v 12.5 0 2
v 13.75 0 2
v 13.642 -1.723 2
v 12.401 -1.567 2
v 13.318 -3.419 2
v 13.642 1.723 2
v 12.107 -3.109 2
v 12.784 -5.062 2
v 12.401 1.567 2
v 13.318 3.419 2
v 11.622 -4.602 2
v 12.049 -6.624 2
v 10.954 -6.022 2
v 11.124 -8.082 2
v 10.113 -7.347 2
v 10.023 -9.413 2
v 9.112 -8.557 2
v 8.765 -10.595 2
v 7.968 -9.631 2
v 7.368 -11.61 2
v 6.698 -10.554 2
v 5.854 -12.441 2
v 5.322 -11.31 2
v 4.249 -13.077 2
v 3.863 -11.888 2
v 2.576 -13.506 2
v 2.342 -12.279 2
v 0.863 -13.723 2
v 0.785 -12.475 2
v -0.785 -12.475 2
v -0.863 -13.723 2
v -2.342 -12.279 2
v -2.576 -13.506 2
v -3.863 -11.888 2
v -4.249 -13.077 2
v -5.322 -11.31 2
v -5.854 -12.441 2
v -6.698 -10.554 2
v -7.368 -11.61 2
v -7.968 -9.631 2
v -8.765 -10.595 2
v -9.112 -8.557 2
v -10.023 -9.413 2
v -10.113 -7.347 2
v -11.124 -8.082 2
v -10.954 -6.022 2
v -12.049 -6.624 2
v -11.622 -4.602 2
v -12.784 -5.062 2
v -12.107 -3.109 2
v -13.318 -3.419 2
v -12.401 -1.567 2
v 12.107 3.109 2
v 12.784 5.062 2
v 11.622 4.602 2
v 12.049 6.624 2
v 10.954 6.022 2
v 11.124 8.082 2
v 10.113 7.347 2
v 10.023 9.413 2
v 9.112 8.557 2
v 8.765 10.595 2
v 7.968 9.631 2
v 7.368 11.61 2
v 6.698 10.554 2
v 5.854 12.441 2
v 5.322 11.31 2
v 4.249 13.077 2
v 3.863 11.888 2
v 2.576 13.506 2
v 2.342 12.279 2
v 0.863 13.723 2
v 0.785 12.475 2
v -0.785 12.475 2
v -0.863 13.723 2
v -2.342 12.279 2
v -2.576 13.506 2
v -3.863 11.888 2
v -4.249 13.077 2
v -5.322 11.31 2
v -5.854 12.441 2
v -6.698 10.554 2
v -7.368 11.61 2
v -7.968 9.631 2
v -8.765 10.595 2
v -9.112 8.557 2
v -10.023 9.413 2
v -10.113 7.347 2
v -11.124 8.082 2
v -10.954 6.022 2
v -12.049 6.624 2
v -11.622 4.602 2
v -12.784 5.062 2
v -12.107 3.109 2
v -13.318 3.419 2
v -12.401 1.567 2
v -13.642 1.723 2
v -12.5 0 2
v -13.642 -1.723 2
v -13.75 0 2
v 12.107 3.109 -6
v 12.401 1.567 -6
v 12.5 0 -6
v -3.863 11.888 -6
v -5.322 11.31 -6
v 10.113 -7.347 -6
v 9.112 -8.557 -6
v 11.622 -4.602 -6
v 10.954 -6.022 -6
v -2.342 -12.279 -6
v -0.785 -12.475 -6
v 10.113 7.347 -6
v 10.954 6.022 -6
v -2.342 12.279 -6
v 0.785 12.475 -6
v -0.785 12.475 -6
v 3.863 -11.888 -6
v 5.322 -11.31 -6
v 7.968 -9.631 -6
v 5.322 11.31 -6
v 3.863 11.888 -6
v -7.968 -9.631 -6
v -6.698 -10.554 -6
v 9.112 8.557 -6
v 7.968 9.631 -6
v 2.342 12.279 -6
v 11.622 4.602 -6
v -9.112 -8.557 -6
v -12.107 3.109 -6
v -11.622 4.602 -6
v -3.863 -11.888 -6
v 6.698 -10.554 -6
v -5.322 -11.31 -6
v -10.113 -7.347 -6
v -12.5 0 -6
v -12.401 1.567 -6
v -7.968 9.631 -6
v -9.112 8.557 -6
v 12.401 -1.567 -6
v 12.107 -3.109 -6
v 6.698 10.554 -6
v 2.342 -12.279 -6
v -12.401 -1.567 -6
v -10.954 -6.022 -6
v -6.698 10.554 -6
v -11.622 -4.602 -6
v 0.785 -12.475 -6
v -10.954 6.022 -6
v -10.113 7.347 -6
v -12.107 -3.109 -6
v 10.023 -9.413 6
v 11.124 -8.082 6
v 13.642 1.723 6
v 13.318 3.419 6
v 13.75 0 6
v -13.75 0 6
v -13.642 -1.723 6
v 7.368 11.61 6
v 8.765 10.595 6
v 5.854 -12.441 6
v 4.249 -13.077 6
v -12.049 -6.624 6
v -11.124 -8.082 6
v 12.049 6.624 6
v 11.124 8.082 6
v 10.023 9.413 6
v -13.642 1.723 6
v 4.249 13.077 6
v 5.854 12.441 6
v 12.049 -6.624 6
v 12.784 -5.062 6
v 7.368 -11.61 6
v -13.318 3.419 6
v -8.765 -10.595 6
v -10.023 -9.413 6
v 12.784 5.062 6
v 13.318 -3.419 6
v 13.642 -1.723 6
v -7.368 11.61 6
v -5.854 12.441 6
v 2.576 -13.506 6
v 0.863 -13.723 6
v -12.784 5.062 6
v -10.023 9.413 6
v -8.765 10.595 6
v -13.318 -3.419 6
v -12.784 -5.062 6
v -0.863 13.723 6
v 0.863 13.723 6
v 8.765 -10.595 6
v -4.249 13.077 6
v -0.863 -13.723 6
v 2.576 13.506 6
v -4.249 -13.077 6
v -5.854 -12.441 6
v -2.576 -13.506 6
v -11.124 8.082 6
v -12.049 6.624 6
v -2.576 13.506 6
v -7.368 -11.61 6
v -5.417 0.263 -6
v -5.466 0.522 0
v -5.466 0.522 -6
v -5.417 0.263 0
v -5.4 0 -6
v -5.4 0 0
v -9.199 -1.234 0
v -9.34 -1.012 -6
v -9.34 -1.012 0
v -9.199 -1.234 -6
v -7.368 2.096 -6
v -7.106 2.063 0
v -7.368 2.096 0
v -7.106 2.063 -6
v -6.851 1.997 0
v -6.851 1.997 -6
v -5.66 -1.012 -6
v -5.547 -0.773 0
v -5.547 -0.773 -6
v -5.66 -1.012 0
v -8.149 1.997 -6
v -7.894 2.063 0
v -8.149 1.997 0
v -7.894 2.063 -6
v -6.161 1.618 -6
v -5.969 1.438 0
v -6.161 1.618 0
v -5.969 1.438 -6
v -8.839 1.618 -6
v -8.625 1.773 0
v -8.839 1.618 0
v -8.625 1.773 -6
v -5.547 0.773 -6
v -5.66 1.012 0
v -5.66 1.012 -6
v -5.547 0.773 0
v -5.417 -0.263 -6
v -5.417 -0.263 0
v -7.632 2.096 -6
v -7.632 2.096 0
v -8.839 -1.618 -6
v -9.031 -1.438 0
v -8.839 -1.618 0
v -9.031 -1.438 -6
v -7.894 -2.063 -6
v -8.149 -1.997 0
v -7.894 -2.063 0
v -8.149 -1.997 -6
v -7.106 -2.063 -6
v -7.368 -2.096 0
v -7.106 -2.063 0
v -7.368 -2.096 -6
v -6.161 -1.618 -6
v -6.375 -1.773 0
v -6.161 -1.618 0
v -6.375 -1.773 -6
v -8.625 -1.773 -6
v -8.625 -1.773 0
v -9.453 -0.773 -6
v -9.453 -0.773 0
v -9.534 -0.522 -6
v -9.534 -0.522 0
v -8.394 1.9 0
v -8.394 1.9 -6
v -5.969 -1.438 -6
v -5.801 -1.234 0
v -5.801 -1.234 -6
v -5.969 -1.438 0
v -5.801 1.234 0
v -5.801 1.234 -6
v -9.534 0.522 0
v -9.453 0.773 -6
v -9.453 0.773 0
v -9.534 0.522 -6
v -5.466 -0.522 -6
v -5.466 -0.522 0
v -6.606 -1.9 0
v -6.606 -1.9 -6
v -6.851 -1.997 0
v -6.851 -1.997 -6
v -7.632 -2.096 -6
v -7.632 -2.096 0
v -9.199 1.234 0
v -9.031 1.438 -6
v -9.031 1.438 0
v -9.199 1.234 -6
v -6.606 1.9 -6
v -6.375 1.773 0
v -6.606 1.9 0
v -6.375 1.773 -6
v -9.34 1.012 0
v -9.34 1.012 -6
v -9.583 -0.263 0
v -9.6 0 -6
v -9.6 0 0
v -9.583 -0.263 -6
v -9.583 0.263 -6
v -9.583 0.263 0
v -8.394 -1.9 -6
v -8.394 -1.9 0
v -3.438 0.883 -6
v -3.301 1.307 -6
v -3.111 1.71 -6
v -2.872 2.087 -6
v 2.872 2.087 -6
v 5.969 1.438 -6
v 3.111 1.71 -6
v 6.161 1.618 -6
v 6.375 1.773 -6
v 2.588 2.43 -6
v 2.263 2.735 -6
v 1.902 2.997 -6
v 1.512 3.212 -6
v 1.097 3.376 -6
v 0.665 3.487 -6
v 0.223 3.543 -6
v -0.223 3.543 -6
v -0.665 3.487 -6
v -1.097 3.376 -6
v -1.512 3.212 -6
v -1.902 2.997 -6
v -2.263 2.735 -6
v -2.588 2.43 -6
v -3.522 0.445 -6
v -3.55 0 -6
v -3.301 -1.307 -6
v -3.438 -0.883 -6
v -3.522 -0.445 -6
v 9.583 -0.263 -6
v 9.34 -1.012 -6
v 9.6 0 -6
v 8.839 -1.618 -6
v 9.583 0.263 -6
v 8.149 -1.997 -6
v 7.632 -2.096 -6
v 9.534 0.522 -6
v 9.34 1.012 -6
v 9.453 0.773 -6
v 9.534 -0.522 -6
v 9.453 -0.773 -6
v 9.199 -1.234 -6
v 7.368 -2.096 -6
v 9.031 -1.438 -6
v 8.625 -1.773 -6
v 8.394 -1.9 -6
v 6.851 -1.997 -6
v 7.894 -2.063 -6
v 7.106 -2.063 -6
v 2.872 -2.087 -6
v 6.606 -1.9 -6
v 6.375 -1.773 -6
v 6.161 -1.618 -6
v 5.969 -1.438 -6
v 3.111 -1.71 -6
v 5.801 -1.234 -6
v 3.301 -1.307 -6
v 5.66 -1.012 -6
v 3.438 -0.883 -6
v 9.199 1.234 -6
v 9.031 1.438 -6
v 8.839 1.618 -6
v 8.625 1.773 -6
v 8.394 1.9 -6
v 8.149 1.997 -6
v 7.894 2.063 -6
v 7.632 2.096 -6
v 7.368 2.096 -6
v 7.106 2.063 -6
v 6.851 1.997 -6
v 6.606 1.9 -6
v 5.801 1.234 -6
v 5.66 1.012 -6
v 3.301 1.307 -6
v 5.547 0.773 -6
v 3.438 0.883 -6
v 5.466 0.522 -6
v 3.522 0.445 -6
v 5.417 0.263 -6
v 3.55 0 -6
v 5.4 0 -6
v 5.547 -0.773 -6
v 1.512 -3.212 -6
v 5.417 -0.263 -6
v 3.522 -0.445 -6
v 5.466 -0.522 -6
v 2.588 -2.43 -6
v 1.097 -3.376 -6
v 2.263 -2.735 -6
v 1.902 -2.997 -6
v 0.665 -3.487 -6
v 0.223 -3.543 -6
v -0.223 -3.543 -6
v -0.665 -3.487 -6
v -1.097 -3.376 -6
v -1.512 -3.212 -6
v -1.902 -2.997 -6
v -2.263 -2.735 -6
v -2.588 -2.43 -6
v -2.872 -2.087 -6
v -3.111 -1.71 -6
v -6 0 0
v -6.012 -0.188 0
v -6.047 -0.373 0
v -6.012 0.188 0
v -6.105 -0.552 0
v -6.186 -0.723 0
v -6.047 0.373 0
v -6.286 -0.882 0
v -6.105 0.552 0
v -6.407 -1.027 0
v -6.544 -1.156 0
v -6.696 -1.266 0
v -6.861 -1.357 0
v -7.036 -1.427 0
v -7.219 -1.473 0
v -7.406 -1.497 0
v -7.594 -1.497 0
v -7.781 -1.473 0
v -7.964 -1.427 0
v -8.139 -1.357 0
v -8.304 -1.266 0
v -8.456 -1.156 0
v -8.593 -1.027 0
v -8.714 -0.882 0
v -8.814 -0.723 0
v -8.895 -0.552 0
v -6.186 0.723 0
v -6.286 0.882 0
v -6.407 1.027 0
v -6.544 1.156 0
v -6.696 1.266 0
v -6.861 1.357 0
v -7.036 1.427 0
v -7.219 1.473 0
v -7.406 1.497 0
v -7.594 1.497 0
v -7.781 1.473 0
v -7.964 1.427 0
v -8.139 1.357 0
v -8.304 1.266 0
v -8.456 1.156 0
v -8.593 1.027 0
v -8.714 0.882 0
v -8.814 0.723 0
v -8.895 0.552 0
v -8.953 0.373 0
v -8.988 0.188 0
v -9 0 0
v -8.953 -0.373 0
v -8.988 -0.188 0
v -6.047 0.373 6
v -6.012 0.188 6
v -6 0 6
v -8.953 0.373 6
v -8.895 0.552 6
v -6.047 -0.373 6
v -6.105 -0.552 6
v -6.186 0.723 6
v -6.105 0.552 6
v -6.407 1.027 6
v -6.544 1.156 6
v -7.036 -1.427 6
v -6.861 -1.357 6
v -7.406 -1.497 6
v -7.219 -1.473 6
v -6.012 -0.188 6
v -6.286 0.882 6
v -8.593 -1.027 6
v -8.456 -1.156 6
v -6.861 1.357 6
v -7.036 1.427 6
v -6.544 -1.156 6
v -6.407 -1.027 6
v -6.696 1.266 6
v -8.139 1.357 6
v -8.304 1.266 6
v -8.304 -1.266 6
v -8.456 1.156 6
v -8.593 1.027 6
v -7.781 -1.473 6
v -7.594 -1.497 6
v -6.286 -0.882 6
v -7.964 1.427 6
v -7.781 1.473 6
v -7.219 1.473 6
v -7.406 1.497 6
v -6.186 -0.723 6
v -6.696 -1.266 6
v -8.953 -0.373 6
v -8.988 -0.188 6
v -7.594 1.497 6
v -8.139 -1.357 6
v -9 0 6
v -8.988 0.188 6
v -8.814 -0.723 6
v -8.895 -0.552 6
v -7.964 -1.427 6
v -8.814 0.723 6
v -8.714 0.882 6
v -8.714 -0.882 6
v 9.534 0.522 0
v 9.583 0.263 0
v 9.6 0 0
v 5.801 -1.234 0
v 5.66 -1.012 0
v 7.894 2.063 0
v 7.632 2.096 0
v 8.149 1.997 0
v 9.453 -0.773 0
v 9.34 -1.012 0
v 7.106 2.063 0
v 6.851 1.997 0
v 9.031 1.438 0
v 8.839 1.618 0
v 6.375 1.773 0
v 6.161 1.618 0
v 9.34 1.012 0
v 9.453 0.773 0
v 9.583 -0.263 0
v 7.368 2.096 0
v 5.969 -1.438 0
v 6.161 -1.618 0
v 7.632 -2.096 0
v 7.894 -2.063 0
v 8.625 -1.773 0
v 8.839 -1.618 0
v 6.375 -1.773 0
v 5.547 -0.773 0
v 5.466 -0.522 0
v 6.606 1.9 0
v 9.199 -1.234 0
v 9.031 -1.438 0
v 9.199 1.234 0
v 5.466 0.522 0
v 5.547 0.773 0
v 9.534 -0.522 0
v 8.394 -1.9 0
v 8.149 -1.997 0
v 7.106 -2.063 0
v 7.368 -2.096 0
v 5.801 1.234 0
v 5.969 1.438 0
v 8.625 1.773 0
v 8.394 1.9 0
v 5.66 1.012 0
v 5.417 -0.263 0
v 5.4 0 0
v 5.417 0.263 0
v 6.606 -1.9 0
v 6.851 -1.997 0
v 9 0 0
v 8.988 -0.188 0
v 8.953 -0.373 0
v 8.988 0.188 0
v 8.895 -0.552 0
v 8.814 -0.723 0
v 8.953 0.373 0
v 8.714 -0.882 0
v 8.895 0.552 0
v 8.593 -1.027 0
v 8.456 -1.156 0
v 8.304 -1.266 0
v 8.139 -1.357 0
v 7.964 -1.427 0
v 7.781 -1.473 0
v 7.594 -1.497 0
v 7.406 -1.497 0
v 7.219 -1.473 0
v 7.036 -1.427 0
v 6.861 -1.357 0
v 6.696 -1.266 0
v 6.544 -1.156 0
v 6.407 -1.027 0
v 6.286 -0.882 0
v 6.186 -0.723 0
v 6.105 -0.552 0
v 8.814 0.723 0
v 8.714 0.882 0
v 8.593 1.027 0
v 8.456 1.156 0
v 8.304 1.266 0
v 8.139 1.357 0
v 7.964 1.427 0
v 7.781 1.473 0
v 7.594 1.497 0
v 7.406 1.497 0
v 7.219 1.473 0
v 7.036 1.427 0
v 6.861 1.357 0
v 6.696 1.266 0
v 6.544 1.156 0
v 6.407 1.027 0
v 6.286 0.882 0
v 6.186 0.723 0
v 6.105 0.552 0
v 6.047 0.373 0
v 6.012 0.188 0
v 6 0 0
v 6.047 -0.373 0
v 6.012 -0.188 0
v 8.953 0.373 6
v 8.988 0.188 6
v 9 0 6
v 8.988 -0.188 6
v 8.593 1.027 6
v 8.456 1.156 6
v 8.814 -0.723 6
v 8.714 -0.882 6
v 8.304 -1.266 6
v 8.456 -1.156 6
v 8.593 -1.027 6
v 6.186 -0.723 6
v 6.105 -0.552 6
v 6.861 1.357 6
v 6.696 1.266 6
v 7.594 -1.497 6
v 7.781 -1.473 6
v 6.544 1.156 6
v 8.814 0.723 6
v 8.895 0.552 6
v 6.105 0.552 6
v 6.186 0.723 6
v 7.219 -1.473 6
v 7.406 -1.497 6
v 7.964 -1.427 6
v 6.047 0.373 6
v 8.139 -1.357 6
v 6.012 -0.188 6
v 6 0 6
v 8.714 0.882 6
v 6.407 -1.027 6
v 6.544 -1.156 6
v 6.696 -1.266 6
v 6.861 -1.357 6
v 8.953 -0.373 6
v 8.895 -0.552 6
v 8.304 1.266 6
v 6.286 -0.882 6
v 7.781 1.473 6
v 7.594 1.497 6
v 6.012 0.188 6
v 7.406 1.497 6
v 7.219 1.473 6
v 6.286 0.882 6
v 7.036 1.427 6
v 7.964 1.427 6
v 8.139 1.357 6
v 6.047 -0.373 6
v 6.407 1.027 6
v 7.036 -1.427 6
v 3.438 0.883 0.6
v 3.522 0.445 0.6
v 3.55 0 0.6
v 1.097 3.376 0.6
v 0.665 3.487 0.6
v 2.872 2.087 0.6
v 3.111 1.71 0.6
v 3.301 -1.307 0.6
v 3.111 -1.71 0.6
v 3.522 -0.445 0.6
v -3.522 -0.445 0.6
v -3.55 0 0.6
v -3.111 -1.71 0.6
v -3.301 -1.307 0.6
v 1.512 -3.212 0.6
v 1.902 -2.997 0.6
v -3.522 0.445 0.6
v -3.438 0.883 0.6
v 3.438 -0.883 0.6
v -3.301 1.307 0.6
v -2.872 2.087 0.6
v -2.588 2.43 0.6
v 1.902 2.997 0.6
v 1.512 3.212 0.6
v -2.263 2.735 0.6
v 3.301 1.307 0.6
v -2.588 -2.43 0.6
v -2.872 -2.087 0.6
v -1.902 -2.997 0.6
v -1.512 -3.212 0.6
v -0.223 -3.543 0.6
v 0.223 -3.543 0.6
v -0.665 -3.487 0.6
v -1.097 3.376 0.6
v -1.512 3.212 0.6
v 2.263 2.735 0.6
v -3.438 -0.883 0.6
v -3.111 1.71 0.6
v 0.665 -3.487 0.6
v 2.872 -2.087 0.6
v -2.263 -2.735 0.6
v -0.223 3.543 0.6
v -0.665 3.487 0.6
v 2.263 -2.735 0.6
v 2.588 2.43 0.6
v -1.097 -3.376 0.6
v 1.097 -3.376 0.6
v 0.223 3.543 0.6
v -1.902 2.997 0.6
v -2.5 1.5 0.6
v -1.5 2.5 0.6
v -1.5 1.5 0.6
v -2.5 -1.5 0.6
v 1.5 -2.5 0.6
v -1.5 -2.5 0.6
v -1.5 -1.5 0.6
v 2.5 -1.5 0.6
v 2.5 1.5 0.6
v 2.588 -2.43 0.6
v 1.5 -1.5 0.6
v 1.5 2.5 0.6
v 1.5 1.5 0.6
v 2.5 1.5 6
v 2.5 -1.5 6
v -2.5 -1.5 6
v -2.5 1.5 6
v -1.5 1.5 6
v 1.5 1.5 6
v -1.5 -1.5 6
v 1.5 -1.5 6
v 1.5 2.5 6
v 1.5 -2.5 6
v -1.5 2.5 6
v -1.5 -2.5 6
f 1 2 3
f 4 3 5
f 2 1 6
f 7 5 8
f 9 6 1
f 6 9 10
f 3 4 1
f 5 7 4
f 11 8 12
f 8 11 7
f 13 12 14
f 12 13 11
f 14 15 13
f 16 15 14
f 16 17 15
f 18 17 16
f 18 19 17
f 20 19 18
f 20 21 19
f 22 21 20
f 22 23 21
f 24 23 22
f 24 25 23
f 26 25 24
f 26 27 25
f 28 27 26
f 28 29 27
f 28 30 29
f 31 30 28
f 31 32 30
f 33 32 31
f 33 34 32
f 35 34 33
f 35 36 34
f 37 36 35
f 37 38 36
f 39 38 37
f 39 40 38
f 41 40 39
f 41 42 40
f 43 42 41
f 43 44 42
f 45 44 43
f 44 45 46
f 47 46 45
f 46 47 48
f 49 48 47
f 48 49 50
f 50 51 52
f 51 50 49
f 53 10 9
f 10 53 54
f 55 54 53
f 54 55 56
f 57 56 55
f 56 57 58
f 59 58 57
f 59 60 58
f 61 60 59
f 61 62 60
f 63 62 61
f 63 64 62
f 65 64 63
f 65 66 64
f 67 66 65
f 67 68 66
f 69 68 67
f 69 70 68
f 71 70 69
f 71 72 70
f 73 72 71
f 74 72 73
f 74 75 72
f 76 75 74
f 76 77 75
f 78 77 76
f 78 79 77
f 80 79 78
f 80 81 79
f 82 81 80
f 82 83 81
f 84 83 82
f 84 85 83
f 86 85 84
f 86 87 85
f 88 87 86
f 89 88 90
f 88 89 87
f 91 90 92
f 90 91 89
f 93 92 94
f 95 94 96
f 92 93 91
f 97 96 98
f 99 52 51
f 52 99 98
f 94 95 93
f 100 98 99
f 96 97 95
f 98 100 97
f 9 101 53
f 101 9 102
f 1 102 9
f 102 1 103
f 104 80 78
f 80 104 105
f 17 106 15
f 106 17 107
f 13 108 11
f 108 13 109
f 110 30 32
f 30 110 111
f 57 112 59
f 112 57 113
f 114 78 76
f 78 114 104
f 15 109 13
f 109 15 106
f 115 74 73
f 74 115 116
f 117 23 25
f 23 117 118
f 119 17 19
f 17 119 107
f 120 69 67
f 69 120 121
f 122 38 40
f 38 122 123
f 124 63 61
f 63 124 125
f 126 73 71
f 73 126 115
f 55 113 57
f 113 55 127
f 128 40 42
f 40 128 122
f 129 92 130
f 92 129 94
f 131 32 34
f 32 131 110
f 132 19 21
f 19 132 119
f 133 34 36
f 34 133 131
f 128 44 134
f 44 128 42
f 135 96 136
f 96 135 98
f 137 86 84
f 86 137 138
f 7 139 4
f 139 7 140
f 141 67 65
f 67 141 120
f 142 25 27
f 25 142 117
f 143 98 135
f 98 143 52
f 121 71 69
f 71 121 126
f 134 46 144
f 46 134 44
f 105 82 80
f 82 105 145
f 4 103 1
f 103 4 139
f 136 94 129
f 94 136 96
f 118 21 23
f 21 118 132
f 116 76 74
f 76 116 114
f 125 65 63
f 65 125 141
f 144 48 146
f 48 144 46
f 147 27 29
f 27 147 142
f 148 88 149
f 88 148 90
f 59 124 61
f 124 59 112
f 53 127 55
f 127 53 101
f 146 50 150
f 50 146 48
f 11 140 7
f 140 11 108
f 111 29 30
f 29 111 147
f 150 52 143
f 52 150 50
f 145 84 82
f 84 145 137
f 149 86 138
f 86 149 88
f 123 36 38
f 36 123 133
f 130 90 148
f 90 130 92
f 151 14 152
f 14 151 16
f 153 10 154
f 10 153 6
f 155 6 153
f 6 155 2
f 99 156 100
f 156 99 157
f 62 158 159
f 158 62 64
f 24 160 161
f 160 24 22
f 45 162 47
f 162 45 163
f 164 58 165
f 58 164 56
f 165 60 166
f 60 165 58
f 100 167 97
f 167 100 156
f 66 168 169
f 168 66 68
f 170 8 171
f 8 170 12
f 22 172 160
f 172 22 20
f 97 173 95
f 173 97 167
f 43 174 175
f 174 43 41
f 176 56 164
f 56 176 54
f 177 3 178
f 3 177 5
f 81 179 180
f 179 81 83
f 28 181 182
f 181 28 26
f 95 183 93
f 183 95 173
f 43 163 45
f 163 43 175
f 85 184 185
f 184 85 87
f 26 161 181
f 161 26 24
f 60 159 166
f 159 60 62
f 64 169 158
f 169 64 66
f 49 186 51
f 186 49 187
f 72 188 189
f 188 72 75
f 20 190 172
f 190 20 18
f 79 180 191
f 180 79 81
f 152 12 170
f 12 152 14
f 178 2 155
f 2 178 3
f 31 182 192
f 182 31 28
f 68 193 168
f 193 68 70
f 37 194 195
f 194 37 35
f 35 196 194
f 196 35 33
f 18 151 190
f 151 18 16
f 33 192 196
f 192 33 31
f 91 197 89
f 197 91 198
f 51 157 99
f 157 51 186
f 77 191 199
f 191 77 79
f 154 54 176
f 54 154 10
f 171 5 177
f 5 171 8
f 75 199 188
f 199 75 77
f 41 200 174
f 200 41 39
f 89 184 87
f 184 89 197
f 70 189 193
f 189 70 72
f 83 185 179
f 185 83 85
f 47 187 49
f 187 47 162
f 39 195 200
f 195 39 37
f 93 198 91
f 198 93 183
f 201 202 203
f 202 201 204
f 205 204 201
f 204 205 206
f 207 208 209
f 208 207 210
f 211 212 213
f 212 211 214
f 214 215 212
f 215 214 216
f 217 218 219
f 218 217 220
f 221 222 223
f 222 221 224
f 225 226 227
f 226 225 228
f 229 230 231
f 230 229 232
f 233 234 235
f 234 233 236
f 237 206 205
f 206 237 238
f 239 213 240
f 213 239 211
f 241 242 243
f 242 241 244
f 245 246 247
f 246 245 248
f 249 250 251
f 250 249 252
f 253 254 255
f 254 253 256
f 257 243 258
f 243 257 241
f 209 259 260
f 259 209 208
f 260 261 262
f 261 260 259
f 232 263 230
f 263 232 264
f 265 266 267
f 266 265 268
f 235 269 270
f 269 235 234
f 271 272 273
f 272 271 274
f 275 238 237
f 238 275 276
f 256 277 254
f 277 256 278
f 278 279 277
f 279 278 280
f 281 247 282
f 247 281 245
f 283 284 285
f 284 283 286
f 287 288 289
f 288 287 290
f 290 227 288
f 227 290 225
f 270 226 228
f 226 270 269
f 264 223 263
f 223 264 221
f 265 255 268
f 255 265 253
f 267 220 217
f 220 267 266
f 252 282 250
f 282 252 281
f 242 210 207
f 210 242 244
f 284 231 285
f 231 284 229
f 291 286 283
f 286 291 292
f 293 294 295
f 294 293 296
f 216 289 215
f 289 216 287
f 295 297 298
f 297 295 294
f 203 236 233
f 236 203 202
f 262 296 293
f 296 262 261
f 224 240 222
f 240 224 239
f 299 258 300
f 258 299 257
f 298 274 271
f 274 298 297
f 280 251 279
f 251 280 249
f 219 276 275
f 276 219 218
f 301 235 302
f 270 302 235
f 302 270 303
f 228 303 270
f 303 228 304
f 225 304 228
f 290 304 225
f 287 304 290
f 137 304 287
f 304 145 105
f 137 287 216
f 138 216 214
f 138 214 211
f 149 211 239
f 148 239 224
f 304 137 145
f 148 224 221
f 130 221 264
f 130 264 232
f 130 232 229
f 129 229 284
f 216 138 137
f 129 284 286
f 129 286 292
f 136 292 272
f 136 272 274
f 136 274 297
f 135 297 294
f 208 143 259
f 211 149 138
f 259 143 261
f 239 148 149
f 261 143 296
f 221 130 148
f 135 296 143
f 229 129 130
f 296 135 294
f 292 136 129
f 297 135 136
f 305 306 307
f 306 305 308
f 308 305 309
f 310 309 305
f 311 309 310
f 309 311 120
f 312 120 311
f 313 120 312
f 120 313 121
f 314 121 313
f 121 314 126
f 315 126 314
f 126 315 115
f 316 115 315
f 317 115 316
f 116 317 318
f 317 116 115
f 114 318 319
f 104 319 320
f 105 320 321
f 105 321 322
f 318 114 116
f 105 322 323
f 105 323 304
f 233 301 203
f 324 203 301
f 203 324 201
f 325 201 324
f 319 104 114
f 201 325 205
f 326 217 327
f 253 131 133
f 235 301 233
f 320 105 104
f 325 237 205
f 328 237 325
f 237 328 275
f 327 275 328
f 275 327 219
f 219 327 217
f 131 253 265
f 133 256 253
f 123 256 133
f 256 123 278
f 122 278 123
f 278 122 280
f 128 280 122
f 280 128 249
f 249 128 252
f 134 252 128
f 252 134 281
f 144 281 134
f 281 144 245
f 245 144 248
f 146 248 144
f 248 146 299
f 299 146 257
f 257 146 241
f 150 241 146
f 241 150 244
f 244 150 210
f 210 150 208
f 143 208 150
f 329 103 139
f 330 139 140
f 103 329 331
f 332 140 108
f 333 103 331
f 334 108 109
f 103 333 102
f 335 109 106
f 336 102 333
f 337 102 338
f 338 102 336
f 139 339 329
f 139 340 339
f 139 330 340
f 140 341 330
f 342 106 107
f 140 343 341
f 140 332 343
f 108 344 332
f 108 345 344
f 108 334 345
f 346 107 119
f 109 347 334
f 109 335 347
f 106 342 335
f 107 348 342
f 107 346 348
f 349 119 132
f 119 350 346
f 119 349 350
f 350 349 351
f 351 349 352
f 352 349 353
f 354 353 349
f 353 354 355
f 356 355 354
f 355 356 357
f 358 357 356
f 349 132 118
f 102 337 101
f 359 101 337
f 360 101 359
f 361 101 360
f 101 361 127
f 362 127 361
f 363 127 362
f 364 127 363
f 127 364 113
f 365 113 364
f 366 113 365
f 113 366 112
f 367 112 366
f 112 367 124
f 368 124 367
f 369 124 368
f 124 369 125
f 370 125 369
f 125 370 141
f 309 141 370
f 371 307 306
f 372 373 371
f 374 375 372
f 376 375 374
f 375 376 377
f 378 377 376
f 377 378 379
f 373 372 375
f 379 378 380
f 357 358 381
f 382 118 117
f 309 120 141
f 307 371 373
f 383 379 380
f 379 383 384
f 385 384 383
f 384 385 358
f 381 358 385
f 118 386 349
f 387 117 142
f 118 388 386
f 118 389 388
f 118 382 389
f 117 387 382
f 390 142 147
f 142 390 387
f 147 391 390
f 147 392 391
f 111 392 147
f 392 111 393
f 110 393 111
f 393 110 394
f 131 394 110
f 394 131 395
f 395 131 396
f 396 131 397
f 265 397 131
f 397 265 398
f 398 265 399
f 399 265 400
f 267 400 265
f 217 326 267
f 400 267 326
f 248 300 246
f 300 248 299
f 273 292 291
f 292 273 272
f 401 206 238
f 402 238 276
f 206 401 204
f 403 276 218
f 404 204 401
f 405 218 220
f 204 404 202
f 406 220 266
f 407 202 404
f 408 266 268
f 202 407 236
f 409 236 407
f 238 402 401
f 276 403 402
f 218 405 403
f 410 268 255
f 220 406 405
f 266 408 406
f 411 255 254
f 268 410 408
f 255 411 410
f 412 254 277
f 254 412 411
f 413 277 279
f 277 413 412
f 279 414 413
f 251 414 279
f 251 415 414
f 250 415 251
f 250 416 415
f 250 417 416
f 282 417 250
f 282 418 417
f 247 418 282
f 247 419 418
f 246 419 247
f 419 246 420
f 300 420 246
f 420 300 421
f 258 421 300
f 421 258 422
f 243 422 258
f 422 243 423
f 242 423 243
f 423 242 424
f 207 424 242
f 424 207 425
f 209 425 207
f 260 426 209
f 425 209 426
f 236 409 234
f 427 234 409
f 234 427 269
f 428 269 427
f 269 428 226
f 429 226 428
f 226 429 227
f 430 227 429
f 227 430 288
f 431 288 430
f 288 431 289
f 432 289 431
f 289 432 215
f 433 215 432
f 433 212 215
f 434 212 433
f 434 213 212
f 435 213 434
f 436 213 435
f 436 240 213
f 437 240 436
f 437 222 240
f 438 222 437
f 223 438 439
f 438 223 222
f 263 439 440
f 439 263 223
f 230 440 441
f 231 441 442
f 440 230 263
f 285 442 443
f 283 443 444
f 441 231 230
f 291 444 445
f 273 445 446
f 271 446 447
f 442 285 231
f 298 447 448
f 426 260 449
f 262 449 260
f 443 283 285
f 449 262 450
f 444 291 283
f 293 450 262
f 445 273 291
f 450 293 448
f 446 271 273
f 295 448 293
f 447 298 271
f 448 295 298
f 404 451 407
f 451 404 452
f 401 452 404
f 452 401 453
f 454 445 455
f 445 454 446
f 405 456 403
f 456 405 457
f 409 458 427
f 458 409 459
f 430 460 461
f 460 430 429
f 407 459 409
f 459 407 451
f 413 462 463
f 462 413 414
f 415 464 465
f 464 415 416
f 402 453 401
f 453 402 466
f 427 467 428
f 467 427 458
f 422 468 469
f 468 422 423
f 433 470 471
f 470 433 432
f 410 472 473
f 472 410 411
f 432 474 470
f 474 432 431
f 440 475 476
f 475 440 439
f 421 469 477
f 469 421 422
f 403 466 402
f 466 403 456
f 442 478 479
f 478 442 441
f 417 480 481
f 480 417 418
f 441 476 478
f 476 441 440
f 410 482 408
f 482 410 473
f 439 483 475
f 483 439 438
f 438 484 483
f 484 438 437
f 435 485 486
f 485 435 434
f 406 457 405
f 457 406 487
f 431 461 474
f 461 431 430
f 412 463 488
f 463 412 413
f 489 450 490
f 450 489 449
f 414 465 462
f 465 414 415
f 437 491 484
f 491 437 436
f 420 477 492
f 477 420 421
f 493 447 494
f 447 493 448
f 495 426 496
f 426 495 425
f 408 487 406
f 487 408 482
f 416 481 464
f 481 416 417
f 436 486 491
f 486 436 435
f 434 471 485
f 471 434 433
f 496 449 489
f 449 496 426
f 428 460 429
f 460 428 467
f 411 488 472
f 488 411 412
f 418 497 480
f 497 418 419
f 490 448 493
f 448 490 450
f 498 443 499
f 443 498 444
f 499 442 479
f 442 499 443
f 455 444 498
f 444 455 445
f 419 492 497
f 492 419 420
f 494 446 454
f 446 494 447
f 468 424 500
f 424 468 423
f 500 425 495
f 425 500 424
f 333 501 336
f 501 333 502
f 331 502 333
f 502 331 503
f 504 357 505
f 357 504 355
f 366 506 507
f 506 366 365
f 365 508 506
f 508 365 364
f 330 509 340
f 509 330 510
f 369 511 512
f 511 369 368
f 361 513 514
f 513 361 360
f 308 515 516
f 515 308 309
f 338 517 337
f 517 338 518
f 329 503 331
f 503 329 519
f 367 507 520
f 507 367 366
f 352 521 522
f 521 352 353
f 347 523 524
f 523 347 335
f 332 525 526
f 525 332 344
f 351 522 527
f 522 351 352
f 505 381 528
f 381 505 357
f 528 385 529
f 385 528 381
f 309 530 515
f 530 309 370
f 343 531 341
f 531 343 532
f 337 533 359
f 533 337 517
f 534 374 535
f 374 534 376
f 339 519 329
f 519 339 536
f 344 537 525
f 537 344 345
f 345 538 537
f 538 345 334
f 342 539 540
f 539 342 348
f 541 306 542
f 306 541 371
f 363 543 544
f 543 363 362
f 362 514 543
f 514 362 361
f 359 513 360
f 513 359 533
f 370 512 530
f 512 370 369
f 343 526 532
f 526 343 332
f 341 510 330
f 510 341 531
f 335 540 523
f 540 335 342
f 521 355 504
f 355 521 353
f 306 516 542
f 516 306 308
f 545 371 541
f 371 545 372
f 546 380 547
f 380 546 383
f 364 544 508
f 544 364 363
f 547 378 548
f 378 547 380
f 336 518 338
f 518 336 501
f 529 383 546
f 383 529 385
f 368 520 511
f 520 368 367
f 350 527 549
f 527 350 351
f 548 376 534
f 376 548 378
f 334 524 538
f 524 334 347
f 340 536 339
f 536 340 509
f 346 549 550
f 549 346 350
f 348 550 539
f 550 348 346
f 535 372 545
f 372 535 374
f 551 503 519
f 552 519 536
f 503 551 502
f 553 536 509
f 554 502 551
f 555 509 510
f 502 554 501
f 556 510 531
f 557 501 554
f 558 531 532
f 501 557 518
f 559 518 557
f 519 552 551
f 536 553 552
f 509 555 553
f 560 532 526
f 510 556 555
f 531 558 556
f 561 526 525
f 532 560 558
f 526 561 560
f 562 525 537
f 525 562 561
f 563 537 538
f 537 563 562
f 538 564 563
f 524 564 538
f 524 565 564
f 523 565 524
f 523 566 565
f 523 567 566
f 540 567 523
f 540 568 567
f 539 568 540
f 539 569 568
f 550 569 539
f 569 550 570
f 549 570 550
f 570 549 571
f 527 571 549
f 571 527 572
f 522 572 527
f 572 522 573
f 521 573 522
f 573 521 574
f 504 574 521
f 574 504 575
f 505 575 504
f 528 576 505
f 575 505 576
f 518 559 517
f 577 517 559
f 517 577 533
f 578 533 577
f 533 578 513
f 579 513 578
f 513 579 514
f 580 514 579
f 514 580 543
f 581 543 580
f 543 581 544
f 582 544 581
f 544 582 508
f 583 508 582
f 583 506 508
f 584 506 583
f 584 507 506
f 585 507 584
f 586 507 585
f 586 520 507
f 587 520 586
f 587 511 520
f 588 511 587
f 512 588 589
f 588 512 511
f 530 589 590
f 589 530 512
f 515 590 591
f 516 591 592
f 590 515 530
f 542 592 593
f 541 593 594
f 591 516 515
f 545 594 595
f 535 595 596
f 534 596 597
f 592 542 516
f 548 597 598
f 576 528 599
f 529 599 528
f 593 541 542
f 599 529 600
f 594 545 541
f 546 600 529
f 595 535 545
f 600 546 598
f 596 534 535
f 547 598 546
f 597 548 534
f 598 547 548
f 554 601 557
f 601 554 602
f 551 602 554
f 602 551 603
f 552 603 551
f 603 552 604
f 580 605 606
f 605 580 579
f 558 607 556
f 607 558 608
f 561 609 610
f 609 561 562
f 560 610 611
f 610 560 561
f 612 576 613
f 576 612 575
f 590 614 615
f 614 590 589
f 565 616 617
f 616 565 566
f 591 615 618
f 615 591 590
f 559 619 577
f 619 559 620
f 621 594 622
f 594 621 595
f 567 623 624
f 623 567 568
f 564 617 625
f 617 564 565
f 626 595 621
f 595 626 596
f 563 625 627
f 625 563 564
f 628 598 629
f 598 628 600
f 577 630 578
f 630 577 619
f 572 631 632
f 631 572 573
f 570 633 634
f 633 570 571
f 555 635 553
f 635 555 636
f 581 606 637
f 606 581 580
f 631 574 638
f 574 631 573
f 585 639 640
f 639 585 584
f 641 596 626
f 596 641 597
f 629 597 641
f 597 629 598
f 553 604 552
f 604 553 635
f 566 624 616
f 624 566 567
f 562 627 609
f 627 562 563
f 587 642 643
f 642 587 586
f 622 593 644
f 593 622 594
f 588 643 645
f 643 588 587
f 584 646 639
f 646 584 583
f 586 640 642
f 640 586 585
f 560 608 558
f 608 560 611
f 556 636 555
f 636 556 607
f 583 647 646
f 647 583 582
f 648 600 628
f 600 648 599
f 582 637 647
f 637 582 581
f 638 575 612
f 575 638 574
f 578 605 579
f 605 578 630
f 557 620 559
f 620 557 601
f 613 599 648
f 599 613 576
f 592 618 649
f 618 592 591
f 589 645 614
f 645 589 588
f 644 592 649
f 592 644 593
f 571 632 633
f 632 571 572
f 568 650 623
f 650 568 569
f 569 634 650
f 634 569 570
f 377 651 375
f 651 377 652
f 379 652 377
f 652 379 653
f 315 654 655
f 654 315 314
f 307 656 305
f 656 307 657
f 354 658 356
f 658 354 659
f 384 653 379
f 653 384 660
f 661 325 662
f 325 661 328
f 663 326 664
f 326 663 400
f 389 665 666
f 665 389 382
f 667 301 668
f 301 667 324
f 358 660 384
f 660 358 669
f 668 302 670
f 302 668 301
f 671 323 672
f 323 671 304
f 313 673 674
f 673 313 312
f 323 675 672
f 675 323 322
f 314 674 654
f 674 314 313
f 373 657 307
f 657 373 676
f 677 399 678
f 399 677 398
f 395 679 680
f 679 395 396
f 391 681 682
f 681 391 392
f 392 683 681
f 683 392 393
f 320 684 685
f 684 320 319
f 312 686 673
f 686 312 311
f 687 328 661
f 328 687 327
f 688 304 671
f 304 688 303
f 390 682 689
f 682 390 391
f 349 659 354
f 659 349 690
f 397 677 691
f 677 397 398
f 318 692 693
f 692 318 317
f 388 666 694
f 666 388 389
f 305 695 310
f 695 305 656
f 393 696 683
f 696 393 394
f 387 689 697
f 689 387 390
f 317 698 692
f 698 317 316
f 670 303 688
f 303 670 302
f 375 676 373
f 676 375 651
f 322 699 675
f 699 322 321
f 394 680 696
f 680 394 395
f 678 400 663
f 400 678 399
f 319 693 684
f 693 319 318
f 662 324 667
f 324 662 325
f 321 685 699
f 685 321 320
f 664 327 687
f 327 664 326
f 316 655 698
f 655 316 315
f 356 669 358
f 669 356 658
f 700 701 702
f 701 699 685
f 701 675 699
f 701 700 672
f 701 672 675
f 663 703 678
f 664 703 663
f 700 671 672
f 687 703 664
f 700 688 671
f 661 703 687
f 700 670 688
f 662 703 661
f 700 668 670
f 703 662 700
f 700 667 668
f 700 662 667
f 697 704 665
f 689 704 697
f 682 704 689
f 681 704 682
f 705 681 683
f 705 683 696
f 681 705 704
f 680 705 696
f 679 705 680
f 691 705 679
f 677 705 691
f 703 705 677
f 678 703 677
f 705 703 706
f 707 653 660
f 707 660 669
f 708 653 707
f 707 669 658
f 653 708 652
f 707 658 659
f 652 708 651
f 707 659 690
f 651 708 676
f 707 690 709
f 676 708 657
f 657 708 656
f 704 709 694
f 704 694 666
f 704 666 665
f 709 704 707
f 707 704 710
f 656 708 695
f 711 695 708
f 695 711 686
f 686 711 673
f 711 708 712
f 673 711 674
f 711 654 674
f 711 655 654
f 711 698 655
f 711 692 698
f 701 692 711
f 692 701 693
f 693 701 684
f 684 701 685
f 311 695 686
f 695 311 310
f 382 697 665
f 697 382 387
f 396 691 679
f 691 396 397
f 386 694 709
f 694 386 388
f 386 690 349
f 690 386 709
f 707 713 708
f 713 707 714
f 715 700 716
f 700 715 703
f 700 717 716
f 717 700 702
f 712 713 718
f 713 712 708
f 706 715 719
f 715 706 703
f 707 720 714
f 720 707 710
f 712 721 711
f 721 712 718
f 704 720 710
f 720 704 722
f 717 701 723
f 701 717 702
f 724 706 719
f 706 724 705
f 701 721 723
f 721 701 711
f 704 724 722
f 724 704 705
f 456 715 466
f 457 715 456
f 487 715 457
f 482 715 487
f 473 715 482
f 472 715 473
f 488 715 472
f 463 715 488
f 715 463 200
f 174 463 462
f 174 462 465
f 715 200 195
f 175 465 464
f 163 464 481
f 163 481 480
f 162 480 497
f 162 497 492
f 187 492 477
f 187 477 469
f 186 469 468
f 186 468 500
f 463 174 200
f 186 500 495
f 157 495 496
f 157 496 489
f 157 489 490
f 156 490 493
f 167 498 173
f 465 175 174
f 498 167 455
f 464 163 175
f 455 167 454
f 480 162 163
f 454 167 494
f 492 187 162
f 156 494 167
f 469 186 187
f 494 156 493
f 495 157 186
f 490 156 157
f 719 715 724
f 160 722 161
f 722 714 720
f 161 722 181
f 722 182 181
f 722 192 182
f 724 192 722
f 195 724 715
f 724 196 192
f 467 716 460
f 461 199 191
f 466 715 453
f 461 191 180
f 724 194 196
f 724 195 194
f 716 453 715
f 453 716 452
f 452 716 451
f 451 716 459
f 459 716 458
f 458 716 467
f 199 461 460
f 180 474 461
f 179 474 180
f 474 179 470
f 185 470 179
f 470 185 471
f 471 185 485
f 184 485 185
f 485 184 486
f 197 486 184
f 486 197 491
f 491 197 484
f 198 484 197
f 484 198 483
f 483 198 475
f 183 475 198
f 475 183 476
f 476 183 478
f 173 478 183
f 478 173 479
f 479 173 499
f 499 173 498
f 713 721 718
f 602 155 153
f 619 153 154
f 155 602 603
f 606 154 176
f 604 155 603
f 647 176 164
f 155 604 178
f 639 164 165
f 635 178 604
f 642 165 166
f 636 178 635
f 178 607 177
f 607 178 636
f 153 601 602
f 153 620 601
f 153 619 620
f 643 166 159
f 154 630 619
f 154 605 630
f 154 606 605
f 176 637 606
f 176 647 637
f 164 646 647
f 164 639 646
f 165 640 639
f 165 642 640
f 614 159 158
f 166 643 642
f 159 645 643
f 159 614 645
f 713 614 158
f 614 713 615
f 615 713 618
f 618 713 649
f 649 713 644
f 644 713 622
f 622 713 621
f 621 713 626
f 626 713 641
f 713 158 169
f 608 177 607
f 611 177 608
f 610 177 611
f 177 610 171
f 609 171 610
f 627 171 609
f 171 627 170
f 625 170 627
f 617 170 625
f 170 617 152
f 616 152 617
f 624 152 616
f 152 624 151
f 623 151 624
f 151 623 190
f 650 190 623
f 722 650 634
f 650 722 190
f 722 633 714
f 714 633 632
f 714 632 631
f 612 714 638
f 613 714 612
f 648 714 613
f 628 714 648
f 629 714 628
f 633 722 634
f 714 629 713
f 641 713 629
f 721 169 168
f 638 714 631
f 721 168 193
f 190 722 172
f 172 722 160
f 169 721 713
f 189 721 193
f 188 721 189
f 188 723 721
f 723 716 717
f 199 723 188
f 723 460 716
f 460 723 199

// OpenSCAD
$fn = 50;

difference() {
	union() {
		translate(v = [0, 0, 0]) {
			rotate(a = [0, 0, 0]) {
				difference() {
					union() {
						translate(v = [0, 0, -6.0]) {
							cylinder(h = 12, r = 14.5);
						}
					}
					union() {
						translate(v = [0, 0, 0]) {
							rotate(a = [0, 0, 0]) {
								difference() {
									union() {
										translate(v = [0, 0, -2.0]) {
											cylinder(h = 4, r = 16.0);
										}
									}
									union() {
										translate(v = [0, 0, -2.01]) {
											cylinder(h = 4.02, r = 12.5);
										}
									}
								}
							}
						}
						translate(v = [0, 0, -3]) {
							rotate(a = [0, 0, 0]) {
								difference() {
									union() {
										translate(v = [0, 0, -2.0]) {
											cylinder(h = 4, r = 16.0);
										}
									}
									union() {
										translate(v = [0, 0, -2.01]) {
											cylinder(h = 4.02, r = 12.5);
										}
									}
								}
							}
						}
						translate(v = [0, 0, -6]) {
							rotate(a = [0, 0, 0]) {
								difference() {
									union() {
										translate(v = [0, 0, -2.0]) {
											cylinder(h = 4, r = 16.0);
										}
									}
									union() {
										translate(v = [0, 0, -2.01]) {
											cylinder(h = 4.02, r = 12.5);
										}
									}
								}
							}
						}
						translate(v = [0, 0, 0]) {
							rotate(a = [0, 0, 0]) {
								difference() {
									union() {
										translate(v = [0, 0, -21.0]) {
											cylinder(h = 42, r = 14.75);
										}
									}
									union() {
										translate(v = [0, 0, -21.01]) {
											cylinder(h = 42.02, r = 13.75);
										}
									}
								}
							}
						}
						translate(v = [-15.0, -15.0, -100.0]) {
							cylinder(h = 200, r = 3.0);
						}
						translate(v = [-15.0, 15.0, -100.0]) {
							cylinder(h = 200, r = 3.0);
						}
						translate(v = [15.0, -15.0, -100.0]) {
							cylinder(h = 200, r = 3.0);
						}
						translate(v = [15.0, 15.0, -100.0]) {
							cylinder(h = 200, r = 3.0);
						}
						translate(v = [-7.5, 0, -6.0]) {
							cylinder(h = 6, r = 2.1);
						}
						translate(v = [-7.5, 0, -7.0]) {
							cylinder(h = 14, r = 1.5);
						}
						translate(v = [7.5, 0, -6.0]) {
							cylinder(h = 6, r = 2.1);
						}
						translate(v = [7.5, 0, -7.0]) {
							cylinder(h = 14, r = 1.5);
						}
						translate(v = [0, 0, -6.000000000000001]) {
							cylinder(h = 6.6, r = 3.55);
						}
						translate(v = [-2.5, -1.5, -7.0]) {
							cube(size = [5, 3, 14]);
						}
						translate(v = [-1.5, -2.5, -7.0]) {
							cube(size = [3, 5, 14]);
						}
					}
				}
			}
		}
	}
	union();
}
